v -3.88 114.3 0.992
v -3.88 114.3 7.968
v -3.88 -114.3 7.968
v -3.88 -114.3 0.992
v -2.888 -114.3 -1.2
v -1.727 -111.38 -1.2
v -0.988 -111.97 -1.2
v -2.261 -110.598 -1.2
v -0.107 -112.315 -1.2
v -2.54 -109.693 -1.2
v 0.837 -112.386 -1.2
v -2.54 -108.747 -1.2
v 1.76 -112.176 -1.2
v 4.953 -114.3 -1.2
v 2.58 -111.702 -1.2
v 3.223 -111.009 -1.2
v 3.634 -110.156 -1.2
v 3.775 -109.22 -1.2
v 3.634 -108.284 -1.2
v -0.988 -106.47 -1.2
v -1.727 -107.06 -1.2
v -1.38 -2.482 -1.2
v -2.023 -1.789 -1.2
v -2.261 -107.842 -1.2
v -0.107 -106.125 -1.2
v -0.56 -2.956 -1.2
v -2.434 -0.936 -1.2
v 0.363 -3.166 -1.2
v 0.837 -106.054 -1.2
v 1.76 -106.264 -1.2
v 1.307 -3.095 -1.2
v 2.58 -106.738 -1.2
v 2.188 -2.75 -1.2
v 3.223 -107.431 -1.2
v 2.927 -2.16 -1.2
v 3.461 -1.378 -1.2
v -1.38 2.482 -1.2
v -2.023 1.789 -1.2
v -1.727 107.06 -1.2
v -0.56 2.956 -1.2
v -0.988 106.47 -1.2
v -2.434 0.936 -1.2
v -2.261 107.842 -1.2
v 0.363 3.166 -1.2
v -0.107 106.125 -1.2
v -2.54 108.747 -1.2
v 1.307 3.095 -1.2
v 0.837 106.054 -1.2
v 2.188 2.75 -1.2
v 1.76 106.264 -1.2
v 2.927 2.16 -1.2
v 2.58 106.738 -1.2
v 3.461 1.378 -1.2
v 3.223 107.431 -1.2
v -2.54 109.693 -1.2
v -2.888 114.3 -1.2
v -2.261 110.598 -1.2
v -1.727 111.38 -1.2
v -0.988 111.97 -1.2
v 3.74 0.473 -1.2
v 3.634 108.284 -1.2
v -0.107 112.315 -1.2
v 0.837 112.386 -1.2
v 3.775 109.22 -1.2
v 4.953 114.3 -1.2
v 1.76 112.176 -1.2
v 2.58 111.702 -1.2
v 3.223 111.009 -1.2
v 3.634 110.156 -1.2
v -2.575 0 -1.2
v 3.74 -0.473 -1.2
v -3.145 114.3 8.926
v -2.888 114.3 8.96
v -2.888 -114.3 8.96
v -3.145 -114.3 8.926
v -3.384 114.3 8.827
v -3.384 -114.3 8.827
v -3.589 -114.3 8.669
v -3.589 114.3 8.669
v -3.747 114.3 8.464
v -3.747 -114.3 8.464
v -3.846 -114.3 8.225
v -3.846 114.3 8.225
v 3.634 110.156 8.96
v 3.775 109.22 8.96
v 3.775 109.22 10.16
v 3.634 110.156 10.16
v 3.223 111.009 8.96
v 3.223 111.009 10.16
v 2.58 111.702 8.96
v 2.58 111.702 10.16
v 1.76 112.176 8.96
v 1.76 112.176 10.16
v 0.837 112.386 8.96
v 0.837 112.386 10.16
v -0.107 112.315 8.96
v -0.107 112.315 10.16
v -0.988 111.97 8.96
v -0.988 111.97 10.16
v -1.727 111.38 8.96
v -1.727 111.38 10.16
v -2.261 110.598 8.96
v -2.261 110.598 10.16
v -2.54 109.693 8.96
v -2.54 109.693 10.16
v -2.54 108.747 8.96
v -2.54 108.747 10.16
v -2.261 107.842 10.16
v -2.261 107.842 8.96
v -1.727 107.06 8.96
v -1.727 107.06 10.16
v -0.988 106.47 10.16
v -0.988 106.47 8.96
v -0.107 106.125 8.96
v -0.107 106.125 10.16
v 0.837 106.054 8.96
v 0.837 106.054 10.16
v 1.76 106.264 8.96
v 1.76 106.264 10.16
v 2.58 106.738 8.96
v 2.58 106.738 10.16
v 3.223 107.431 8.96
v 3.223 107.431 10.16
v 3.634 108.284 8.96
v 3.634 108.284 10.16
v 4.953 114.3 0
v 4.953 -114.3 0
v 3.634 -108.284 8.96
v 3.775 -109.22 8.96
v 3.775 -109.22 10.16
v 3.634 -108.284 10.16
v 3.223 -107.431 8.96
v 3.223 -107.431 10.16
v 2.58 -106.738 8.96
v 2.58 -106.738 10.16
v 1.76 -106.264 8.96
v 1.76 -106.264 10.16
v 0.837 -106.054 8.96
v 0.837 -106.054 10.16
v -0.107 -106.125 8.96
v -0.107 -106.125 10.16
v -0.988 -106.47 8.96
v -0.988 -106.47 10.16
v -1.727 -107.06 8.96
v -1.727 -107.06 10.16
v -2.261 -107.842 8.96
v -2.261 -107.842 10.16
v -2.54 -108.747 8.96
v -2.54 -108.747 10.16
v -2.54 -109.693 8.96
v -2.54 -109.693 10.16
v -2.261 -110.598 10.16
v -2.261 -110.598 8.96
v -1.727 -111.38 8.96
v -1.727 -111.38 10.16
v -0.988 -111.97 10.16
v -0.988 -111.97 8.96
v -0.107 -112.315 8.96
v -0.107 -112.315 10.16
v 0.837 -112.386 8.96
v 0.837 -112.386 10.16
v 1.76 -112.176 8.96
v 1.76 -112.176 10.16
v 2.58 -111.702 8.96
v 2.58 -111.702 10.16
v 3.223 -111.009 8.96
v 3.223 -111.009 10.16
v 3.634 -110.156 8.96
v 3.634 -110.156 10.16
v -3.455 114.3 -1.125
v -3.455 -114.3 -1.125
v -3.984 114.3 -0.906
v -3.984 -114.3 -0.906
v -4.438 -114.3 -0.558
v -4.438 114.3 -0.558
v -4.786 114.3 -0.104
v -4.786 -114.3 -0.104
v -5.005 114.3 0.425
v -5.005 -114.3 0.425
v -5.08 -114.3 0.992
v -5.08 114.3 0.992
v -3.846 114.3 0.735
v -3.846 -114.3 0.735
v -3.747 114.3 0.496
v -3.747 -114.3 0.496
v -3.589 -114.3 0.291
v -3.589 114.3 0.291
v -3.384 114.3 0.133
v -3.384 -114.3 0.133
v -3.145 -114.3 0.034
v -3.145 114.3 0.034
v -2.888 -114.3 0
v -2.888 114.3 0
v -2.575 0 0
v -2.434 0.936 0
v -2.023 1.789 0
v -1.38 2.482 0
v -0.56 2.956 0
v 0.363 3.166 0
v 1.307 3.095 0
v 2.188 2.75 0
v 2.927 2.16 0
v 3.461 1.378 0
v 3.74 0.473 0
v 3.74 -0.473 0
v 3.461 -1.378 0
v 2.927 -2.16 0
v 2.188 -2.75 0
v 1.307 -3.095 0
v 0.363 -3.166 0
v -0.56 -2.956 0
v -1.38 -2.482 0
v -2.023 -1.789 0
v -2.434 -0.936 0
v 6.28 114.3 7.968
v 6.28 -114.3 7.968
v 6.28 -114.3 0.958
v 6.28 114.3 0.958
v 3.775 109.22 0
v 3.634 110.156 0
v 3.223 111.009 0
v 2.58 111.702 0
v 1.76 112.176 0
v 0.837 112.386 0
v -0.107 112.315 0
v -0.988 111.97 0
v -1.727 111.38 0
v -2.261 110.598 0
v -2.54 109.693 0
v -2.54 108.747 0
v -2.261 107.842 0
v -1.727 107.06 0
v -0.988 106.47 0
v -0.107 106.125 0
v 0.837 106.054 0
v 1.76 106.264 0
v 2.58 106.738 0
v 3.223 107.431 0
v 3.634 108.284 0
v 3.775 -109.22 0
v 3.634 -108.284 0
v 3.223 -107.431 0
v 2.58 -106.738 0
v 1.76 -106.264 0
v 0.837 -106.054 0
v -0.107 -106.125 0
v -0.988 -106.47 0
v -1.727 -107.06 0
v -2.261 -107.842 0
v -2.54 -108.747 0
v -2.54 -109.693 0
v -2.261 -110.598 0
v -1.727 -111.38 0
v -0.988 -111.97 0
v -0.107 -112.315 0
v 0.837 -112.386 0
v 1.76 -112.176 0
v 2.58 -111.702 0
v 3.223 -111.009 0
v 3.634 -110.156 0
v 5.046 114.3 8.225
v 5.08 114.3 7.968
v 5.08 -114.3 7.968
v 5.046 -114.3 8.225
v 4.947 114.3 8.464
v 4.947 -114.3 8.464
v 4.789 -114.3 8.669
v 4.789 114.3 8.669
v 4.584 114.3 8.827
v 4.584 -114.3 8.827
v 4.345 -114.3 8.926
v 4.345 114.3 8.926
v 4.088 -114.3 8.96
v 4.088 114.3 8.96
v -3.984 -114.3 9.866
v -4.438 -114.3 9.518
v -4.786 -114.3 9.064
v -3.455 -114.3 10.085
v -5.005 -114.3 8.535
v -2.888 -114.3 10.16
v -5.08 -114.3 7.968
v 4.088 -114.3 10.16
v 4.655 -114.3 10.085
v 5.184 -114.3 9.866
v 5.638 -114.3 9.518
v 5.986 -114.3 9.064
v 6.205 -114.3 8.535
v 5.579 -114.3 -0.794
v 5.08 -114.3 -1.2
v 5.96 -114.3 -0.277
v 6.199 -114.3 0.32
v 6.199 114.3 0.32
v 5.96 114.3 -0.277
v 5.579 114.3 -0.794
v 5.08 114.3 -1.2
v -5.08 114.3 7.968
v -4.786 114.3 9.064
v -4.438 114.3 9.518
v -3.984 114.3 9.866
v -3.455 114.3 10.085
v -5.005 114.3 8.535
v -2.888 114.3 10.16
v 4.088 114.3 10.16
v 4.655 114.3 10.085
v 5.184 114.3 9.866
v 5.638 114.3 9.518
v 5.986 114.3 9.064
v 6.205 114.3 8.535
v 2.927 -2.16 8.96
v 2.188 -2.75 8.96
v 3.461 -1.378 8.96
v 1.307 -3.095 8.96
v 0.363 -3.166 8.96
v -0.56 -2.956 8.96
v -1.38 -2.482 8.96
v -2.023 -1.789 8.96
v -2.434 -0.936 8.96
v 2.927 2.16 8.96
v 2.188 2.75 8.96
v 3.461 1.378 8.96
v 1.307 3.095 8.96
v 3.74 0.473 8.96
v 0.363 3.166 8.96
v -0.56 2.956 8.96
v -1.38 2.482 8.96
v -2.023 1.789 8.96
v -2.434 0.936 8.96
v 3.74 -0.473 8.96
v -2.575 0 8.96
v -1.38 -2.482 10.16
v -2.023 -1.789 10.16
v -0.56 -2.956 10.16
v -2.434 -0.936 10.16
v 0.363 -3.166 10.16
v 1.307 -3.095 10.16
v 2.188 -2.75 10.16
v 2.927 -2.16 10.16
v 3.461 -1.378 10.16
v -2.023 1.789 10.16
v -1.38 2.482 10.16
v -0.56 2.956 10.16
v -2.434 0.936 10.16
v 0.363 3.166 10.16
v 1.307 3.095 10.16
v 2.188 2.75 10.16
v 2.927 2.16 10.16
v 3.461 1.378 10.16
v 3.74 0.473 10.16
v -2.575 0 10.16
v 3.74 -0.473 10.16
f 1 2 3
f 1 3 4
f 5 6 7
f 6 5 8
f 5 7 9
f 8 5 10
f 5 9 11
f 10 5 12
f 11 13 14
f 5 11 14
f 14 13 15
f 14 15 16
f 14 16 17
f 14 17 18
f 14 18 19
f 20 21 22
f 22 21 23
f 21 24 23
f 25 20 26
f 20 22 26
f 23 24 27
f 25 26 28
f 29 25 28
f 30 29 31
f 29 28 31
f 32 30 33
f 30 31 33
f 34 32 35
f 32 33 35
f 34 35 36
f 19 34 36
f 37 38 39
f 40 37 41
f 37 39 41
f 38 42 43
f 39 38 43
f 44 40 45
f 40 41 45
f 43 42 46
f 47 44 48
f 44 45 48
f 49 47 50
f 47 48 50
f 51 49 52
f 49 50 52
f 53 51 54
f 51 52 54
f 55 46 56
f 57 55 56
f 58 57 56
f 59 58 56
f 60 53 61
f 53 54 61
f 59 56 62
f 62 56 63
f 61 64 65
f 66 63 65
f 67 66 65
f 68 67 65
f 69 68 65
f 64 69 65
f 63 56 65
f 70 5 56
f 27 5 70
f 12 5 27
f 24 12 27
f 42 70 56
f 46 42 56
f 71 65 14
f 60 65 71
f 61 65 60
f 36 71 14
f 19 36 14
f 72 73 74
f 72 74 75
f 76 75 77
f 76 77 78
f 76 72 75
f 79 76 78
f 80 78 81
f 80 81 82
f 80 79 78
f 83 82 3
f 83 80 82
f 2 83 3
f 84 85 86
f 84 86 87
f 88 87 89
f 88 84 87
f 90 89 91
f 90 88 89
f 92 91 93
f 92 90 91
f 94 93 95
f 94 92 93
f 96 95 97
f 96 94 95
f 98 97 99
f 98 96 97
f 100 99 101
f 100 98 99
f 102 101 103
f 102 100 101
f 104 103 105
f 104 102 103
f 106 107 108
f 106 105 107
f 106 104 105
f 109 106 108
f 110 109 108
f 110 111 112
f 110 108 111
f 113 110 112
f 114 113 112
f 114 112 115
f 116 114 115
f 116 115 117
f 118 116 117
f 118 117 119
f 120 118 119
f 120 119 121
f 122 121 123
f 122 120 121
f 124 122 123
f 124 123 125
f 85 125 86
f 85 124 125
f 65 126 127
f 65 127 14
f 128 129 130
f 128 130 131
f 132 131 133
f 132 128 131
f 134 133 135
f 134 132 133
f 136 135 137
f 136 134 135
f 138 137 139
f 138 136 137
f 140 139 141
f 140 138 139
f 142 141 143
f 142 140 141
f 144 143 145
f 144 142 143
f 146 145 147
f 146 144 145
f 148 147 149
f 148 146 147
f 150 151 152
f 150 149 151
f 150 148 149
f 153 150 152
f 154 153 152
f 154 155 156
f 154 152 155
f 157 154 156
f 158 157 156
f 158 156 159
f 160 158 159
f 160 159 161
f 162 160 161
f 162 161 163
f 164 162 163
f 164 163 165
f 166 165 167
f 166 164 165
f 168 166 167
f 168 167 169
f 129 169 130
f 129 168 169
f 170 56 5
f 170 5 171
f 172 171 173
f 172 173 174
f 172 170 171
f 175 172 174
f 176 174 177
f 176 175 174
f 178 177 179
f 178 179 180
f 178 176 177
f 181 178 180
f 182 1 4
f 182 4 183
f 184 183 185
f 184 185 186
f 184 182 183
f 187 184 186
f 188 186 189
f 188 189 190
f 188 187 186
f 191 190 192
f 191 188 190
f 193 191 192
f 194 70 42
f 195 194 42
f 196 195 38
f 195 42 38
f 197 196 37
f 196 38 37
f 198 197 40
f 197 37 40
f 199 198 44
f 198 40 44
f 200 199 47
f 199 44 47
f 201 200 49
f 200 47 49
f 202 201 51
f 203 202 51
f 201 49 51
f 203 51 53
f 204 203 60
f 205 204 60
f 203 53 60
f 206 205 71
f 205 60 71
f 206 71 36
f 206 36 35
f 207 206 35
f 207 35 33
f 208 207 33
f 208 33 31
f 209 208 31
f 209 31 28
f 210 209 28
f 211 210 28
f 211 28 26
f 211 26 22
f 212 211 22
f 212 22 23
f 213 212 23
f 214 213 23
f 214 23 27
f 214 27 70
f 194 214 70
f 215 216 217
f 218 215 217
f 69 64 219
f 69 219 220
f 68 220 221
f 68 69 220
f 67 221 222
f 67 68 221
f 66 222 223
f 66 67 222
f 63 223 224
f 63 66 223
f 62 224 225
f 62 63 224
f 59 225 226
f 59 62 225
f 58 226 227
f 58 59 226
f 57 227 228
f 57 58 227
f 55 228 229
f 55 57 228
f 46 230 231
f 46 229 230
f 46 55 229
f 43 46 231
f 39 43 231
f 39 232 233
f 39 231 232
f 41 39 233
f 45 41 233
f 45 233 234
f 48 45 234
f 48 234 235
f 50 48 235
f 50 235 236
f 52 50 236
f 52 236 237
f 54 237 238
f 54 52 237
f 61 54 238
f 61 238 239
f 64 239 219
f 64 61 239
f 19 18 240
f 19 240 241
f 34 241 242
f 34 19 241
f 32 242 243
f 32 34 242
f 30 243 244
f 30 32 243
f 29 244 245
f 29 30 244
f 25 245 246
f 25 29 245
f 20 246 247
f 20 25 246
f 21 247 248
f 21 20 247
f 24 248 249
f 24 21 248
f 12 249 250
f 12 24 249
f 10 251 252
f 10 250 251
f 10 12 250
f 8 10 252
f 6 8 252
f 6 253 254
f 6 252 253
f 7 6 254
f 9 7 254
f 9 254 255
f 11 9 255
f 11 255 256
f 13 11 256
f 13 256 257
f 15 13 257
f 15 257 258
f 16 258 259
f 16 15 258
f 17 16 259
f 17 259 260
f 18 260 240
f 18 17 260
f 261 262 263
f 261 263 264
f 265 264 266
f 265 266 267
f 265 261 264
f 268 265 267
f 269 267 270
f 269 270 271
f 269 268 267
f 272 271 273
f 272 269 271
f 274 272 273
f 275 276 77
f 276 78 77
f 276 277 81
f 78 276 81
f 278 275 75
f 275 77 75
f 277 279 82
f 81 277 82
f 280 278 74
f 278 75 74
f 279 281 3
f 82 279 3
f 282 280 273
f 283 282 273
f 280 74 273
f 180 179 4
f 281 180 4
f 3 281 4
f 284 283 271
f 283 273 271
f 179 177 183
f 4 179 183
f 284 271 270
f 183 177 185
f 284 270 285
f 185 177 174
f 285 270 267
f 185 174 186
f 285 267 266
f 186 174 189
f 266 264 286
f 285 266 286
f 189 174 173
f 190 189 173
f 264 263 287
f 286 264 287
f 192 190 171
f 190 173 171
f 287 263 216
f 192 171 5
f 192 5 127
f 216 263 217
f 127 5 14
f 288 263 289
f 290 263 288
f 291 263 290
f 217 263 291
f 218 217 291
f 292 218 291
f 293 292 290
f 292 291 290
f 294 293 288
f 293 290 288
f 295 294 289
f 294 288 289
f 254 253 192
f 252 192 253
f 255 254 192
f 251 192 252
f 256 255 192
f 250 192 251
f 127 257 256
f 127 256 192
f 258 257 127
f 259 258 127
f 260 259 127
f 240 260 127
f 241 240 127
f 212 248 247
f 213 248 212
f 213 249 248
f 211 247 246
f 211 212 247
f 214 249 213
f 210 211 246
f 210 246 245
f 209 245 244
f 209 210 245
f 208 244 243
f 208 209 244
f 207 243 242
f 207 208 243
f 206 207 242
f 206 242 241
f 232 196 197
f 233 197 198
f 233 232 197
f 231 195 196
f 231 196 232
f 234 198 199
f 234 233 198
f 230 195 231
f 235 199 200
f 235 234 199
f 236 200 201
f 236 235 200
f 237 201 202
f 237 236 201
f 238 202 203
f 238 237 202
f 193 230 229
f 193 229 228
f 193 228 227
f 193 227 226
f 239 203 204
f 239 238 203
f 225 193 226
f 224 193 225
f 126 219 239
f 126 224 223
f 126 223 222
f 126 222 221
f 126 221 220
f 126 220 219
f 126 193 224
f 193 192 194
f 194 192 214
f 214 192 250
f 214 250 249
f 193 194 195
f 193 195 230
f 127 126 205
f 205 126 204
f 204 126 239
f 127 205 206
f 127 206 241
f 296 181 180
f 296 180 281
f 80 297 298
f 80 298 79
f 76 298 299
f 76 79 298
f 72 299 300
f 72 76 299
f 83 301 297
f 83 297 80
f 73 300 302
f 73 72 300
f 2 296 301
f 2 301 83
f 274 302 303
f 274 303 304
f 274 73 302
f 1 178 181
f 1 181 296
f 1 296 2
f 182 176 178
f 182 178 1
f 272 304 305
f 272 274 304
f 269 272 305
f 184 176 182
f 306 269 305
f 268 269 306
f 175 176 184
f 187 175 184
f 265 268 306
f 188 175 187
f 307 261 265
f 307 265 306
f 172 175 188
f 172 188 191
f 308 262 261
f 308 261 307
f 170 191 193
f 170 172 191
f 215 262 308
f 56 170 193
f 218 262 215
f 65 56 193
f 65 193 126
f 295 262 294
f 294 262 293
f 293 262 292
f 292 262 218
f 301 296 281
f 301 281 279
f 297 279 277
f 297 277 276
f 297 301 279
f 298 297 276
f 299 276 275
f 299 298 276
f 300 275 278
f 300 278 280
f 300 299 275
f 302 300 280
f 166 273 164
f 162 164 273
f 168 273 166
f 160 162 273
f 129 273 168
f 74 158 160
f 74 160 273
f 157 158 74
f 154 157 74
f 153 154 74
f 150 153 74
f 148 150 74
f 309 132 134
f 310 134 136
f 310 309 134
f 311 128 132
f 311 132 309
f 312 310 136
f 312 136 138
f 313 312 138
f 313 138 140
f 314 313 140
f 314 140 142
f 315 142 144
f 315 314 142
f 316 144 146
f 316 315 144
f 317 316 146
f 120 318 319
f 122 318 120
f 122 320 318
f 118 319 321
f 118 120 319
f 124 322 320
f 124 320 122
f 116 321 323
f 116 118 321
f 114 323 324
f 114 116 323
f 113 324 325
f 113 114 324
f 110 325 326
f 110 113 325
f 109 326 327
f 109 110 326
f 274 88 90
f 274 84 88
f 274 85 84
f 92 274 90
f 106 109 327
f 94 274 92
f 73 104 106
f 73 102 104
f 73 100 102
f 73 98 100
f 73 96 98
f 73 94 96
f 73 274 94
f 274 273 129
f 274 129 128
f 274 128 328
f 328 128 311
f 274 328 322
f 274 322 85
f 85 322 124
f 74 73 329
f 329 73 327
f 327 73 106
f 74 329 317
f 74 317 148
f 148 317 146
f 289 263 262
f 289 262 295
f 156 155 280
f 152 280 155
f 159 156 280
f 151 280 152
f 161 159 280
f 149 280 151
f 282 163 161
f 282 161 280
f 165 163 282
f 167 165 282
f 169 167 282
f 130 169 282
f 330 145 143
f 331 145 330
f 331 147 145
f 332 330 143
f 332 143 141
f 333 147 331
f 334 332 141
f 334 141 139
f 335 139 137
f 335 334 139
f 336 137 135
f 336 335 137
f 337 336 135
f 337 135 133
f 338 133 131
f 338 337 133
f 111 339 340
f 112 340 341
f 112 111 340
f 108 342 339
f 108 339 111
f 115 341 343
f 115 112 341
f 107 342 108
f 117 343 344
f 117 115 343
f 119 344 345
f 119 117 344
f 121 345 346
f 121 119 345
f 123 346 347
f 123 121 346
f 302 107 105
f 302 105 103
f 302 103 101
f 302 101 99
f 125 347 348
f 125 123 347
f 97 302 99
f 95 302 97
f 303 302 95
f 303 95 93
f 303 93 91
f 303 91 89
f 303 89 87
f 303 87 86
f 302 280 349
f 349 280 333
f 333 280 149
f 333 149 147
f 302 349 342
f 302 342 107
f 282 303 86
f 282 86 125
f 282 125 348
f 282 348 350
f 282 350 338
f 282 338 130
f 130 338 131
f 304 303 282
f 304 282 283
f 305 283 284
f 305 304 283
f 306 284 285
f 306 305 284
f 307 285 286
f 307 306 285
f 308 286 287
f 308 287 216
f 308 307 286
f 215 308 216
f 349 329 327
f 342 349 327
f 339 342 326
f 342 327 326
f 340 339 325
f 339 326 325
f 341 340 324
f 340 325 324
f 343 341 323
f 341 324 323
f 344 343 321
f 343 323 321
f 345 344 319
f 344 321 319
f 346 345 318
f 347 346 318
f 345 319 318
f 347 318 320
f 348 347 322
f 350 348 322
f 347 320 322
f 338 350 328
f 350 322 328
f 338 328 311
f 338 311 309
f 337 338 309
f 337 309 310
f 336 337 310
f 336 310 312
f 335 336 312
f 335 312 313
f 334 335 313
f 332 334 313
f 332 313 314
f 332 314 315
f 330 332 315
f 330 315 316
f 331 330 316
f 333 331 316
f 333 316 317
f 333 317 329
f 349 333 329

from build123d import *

# Parameters (mm, degrees)
SKETCH12_W                   = 10.16
SKETCH12_H                   = 228.6
BASE_FLANGE1_DEPTH           = 1.2
EDGE_FLANGE1_STRIP_W         = 6.784000096
EDGE_FLANGE1_STRIP_H         = 1.2
EDGE_FLANGE1_STRIP_CUT_DEPTH = 228.6
EDGE_FLANGE1_DEPTH           = 228.6
EDGE_FLANGE2_STRIP_W         = 6.784000096
EDGE_FLANGE2_STRIP_H         = 1.2
EDGE_FLANGE2_STRIP_CUT_DEPTH = 228.6
EDGE_FLANGE2_DEPTH           = 228.6
EDGE_FLANGE3_STRIP_W         = 6.784000096
EDGE_FLANGE3_STRIP_H         = 1.2
EDGE_FLANGE3_STRIP_CUT_DEPTH = 228.6
EDGE_FLANGE3_DEPTH           = 228.6
F_1_4_0_25_DIAMETER_HOLE1_D  = 6.35
CUT_EXTRUDE1_DEPTH           = 116.034681727
CUT_EXTRUDE1_DEPTH_BACK      = 116.034681727
SKETCH30_R                   = 3.175
CLOSED_START                 = -114.3
CLOSED_CORNER1_OUTLINE_W     = 0.127
CLOSED_CORNER1_OUTLINE_H     = 1.2
CLOSED_CORNER1_DEPTH         = 228.6
CLOSED_CORNER1_2_OUTLINE_W   = 1.2
CLOSED_CORNER1_2_OUTLINE_H   = 6.35
CLOSED_CORNER1_2_DEPTH       = 228.6
FILLET1_R                    = 2.54


# Read off the part's stored shape, not the designer's step: Closed Corner1
# Sheet-metal steps are written as plain solids
with BuildPart() as part:
    # Sketch12 → Base-Flange1 (new body)
    with BuildSketch(Plane.XY):
        Rectangle(SKETCH12_W, SKETCH12_H)
    extrude(amount=-BASE_FLANGE1_DEPTH)

    # Edge-Flange1 strip (across the edge) → Edge-Flange1 strip cut (cut)
    with BuildSketch(Plane(origin=(-5.08, 114.3, 0), x_dir=(1, 0, 0), z_dir=(0, -1, 0))):
        with Locations((-1.2, -0.6)):
            Rectangle(EDGE_FLANGE1_STRIP_W, EDGE_FLANGE1_STRIP_H)
    extrude(amount=EDGE_FLANGE1_STRIP_CUT_DEPTH, mode=Mode.SUBTRACT)

    # Edge-Flange1 section (across the edge) → Edge-Flange1 (add)
    with BuildSketch(Plane(origin=(-5.08, 114.3, 0), x_dir=(1, 0, 0), z_dir=(0, -1, 0))):
        with BuildLine():
            Line((0, 0.992000048), (0, 10.16))
            Line((0, 10.16), (1.2, 10.16))
            Line((1.2, 10.16), (1.2, 0.992000048))
            ThreePointArc((1.2, 0.992000048), (1.490550087, 0.290550087), (2.192000048, 0))
            Line((2.192000048, 0), (2.192000048, -1.2))
            ThreePointArc((2.192000048, -1.2), (0.64202195, -0.55797805), (0, 0.992000048))
        make_face()
    extrude(amount=EDGE_FLANGE1_DEPTH)

    # Edge-Flange2 strip (across the edge) → Edge-Flange2 strip cut (cut)
    with BuildSketch(Plane(origin=(-3.88, 114.3, 10.16), x_dir=(0, 0, -1), z_dir=(0, -1, 0))):
        with Locations((-1.2, -0.6)):
            Rectangle(EDGE_FLANGE2_STRIP_W, EDGE_FLANGE2_STRIP_H)
    extrude(amount=EDGE_FLANGE2_STRIP_CUT_DEPTH, mode=Mode.SUBTRACT)

    # Edge-Flange2 section (across the edge) → Edge-Flange2 (add)
    with BuildSketch(Plane(origin=(-3.88, 114.3, 10.16), x_dir=(0, 0, -1), z_dir=(0, -1, 0))):
        with BuildLine():
            Line((0, 0.992000048), (0, 8.96))
            Line((0, 8.96), (1.2, 8.96))
            Line((1.2, 8.96), (1.2, 0.992000048))
            ThreePointArc((1.2, 0.992000048), (1.490550087, 0.290550087), (2.192000048, 0))
            Line((2.192000048, 0), (2.192000048, -1.2))
            ThreePointArc((2.192000048, -1.2), (0.64202195, -0.55797805), (0, 0.992000048))
        make_face()
    extrude(amount=EDGE_FLANGE2_DEPTH)

    # Edge-Flange3 strip (across the edge) → Edge-Flange3 strip cut (cut)
    with BuildSketch(Plane(origin=(5.08, 114.3, 8.96), x_dir=(-1, 0, 0), z_dir=(0, -1, 0))):
        with Locations((-2.4, -0.6)):
            Rectangle(EDGE_FLANGE3_STRIP_W, EDGE_FLANGE3_STRIP_H)
    extrude(amount=EDGE_FLANGE3_STRIP_CUT_DEPTH, mode=Mode.SUBTRACT)

    # Edge-Flange3 section (across the edge) → Edge-Flange3 (add)
    with BuildSketch(Plane(origin=(5.08, 114.3, 8.96), x_dir=(-1, 0, 0), z_dir=(0, -1, 0))):
        with BuildLine():
            Line((-1.2, 0.992000048), (-1.2, 3.81))
            Line((-1.2, 3.81), (0, 3.81))
            Line((0, 3.81), (0, 0.992000048))
            ThreePointArc((0, 0.992000048), (0.290550087, 0.290550087), (0.992000048, 0))
            Line((0.992000048, 0), (0.992000048, -1.2))
            ThreePointArc((0.992000048, -1.2), (-0.55797805, -0.55797805), (-1.2, 0.992000048))
        make_face()
    extrude(amount=EDGE_FLANGE3_DEPTH)

    # 1/4 (0.25) Diameter Hole1 (through all)
    with Locations(Plane.XY.offset(10.16)):
        with Locations((0.6, 0)):
            Hole(F_1_4_0_25_DIAMETER_HOLE1_D / 2)

    # Sketch30 → Cut-Extrude1 (cut, two sides: drawn at the far end of the back side and taken through both)
    with BuildSketch(Plane.XY.offset(10.16).offset(-CUT_EXTRUDE1_DEPTH_BACK)):
        with Locations((0.6, -109.22)):
            Circle(SKETCH30_R)
        with Locations((0.6, 109.22)):
            Circle(SKETCH30_R)
    extrude(amount=CUT_EXTRUDE1_DEPTH + CUT_EXTRUDE1_DEPTH_BACK, mode=Mode.SUBTRACT)

    # Closed Corner1 outline → Closed Corner1 (cut)
    with BuildSketch(Plane(origin=(0, 0, 0), x_dir=(1, 0, 0), z_dir=(0, 1, 0)).offset(CLOSED_START)):
        with Locations((5.0165, 0.6)):
            Rectangle(CLOSED_CORNER1_OUTLINE_W, CLOSED_CORNER1_OUTLINE_H)
    extrude(amount=CLOSED_CORNER1_DEPTH, mode=Mode.SUBTRACT)

    # Closed Corner1 2 outline → Closed Corner1 2 (add)
    with BuildSketch(Plane(origin=(0, 0, 0), x_dir=(1, 0, 0), z_dir=(0, 1, 0)).offset(CLOSED_START)):
        with Locations((5.68, -1.975)):
            Rectangle(CLOSED_CORNER1_2_OUTLINE_W, CLOSED_CORNER1_2_OUTLINE_H)
    extrude(amount=CLOSED_CORNER1_2_DEPTH)

    # Fillet1
    # the kernel refuses this fillet: 2.54 mm, written as the material it takes off along each edge
    with BuildSketch(Plane(origin=(6.28, -119.694441584, -1.2), x_dir=(0, 0, 1), z_dir=(0, 1, 0))) as fillet1_piece_1:
        with BuildLine():
            CenterArc((2.157776633, -2.54), FILLET1_R, 90, 58.159322109)
            Line((0, -1.2), (-0.043155533, -1.1732))
            ThreePointArc((-0.043155533, -1.1732), (-0.0508, -0.6), (-0.0508, 0))
            Line((-0.0508, 0), (0, 0.0508))
            Line((0, 0.0508), (2.157776633, 0.0508))
            Line((2.157776633, 0.0508), (2.157776633, 0))
        make_face()
    extrude(amount=239.388883167, mode=Mode.SUBTRACT)


solid = part.part
